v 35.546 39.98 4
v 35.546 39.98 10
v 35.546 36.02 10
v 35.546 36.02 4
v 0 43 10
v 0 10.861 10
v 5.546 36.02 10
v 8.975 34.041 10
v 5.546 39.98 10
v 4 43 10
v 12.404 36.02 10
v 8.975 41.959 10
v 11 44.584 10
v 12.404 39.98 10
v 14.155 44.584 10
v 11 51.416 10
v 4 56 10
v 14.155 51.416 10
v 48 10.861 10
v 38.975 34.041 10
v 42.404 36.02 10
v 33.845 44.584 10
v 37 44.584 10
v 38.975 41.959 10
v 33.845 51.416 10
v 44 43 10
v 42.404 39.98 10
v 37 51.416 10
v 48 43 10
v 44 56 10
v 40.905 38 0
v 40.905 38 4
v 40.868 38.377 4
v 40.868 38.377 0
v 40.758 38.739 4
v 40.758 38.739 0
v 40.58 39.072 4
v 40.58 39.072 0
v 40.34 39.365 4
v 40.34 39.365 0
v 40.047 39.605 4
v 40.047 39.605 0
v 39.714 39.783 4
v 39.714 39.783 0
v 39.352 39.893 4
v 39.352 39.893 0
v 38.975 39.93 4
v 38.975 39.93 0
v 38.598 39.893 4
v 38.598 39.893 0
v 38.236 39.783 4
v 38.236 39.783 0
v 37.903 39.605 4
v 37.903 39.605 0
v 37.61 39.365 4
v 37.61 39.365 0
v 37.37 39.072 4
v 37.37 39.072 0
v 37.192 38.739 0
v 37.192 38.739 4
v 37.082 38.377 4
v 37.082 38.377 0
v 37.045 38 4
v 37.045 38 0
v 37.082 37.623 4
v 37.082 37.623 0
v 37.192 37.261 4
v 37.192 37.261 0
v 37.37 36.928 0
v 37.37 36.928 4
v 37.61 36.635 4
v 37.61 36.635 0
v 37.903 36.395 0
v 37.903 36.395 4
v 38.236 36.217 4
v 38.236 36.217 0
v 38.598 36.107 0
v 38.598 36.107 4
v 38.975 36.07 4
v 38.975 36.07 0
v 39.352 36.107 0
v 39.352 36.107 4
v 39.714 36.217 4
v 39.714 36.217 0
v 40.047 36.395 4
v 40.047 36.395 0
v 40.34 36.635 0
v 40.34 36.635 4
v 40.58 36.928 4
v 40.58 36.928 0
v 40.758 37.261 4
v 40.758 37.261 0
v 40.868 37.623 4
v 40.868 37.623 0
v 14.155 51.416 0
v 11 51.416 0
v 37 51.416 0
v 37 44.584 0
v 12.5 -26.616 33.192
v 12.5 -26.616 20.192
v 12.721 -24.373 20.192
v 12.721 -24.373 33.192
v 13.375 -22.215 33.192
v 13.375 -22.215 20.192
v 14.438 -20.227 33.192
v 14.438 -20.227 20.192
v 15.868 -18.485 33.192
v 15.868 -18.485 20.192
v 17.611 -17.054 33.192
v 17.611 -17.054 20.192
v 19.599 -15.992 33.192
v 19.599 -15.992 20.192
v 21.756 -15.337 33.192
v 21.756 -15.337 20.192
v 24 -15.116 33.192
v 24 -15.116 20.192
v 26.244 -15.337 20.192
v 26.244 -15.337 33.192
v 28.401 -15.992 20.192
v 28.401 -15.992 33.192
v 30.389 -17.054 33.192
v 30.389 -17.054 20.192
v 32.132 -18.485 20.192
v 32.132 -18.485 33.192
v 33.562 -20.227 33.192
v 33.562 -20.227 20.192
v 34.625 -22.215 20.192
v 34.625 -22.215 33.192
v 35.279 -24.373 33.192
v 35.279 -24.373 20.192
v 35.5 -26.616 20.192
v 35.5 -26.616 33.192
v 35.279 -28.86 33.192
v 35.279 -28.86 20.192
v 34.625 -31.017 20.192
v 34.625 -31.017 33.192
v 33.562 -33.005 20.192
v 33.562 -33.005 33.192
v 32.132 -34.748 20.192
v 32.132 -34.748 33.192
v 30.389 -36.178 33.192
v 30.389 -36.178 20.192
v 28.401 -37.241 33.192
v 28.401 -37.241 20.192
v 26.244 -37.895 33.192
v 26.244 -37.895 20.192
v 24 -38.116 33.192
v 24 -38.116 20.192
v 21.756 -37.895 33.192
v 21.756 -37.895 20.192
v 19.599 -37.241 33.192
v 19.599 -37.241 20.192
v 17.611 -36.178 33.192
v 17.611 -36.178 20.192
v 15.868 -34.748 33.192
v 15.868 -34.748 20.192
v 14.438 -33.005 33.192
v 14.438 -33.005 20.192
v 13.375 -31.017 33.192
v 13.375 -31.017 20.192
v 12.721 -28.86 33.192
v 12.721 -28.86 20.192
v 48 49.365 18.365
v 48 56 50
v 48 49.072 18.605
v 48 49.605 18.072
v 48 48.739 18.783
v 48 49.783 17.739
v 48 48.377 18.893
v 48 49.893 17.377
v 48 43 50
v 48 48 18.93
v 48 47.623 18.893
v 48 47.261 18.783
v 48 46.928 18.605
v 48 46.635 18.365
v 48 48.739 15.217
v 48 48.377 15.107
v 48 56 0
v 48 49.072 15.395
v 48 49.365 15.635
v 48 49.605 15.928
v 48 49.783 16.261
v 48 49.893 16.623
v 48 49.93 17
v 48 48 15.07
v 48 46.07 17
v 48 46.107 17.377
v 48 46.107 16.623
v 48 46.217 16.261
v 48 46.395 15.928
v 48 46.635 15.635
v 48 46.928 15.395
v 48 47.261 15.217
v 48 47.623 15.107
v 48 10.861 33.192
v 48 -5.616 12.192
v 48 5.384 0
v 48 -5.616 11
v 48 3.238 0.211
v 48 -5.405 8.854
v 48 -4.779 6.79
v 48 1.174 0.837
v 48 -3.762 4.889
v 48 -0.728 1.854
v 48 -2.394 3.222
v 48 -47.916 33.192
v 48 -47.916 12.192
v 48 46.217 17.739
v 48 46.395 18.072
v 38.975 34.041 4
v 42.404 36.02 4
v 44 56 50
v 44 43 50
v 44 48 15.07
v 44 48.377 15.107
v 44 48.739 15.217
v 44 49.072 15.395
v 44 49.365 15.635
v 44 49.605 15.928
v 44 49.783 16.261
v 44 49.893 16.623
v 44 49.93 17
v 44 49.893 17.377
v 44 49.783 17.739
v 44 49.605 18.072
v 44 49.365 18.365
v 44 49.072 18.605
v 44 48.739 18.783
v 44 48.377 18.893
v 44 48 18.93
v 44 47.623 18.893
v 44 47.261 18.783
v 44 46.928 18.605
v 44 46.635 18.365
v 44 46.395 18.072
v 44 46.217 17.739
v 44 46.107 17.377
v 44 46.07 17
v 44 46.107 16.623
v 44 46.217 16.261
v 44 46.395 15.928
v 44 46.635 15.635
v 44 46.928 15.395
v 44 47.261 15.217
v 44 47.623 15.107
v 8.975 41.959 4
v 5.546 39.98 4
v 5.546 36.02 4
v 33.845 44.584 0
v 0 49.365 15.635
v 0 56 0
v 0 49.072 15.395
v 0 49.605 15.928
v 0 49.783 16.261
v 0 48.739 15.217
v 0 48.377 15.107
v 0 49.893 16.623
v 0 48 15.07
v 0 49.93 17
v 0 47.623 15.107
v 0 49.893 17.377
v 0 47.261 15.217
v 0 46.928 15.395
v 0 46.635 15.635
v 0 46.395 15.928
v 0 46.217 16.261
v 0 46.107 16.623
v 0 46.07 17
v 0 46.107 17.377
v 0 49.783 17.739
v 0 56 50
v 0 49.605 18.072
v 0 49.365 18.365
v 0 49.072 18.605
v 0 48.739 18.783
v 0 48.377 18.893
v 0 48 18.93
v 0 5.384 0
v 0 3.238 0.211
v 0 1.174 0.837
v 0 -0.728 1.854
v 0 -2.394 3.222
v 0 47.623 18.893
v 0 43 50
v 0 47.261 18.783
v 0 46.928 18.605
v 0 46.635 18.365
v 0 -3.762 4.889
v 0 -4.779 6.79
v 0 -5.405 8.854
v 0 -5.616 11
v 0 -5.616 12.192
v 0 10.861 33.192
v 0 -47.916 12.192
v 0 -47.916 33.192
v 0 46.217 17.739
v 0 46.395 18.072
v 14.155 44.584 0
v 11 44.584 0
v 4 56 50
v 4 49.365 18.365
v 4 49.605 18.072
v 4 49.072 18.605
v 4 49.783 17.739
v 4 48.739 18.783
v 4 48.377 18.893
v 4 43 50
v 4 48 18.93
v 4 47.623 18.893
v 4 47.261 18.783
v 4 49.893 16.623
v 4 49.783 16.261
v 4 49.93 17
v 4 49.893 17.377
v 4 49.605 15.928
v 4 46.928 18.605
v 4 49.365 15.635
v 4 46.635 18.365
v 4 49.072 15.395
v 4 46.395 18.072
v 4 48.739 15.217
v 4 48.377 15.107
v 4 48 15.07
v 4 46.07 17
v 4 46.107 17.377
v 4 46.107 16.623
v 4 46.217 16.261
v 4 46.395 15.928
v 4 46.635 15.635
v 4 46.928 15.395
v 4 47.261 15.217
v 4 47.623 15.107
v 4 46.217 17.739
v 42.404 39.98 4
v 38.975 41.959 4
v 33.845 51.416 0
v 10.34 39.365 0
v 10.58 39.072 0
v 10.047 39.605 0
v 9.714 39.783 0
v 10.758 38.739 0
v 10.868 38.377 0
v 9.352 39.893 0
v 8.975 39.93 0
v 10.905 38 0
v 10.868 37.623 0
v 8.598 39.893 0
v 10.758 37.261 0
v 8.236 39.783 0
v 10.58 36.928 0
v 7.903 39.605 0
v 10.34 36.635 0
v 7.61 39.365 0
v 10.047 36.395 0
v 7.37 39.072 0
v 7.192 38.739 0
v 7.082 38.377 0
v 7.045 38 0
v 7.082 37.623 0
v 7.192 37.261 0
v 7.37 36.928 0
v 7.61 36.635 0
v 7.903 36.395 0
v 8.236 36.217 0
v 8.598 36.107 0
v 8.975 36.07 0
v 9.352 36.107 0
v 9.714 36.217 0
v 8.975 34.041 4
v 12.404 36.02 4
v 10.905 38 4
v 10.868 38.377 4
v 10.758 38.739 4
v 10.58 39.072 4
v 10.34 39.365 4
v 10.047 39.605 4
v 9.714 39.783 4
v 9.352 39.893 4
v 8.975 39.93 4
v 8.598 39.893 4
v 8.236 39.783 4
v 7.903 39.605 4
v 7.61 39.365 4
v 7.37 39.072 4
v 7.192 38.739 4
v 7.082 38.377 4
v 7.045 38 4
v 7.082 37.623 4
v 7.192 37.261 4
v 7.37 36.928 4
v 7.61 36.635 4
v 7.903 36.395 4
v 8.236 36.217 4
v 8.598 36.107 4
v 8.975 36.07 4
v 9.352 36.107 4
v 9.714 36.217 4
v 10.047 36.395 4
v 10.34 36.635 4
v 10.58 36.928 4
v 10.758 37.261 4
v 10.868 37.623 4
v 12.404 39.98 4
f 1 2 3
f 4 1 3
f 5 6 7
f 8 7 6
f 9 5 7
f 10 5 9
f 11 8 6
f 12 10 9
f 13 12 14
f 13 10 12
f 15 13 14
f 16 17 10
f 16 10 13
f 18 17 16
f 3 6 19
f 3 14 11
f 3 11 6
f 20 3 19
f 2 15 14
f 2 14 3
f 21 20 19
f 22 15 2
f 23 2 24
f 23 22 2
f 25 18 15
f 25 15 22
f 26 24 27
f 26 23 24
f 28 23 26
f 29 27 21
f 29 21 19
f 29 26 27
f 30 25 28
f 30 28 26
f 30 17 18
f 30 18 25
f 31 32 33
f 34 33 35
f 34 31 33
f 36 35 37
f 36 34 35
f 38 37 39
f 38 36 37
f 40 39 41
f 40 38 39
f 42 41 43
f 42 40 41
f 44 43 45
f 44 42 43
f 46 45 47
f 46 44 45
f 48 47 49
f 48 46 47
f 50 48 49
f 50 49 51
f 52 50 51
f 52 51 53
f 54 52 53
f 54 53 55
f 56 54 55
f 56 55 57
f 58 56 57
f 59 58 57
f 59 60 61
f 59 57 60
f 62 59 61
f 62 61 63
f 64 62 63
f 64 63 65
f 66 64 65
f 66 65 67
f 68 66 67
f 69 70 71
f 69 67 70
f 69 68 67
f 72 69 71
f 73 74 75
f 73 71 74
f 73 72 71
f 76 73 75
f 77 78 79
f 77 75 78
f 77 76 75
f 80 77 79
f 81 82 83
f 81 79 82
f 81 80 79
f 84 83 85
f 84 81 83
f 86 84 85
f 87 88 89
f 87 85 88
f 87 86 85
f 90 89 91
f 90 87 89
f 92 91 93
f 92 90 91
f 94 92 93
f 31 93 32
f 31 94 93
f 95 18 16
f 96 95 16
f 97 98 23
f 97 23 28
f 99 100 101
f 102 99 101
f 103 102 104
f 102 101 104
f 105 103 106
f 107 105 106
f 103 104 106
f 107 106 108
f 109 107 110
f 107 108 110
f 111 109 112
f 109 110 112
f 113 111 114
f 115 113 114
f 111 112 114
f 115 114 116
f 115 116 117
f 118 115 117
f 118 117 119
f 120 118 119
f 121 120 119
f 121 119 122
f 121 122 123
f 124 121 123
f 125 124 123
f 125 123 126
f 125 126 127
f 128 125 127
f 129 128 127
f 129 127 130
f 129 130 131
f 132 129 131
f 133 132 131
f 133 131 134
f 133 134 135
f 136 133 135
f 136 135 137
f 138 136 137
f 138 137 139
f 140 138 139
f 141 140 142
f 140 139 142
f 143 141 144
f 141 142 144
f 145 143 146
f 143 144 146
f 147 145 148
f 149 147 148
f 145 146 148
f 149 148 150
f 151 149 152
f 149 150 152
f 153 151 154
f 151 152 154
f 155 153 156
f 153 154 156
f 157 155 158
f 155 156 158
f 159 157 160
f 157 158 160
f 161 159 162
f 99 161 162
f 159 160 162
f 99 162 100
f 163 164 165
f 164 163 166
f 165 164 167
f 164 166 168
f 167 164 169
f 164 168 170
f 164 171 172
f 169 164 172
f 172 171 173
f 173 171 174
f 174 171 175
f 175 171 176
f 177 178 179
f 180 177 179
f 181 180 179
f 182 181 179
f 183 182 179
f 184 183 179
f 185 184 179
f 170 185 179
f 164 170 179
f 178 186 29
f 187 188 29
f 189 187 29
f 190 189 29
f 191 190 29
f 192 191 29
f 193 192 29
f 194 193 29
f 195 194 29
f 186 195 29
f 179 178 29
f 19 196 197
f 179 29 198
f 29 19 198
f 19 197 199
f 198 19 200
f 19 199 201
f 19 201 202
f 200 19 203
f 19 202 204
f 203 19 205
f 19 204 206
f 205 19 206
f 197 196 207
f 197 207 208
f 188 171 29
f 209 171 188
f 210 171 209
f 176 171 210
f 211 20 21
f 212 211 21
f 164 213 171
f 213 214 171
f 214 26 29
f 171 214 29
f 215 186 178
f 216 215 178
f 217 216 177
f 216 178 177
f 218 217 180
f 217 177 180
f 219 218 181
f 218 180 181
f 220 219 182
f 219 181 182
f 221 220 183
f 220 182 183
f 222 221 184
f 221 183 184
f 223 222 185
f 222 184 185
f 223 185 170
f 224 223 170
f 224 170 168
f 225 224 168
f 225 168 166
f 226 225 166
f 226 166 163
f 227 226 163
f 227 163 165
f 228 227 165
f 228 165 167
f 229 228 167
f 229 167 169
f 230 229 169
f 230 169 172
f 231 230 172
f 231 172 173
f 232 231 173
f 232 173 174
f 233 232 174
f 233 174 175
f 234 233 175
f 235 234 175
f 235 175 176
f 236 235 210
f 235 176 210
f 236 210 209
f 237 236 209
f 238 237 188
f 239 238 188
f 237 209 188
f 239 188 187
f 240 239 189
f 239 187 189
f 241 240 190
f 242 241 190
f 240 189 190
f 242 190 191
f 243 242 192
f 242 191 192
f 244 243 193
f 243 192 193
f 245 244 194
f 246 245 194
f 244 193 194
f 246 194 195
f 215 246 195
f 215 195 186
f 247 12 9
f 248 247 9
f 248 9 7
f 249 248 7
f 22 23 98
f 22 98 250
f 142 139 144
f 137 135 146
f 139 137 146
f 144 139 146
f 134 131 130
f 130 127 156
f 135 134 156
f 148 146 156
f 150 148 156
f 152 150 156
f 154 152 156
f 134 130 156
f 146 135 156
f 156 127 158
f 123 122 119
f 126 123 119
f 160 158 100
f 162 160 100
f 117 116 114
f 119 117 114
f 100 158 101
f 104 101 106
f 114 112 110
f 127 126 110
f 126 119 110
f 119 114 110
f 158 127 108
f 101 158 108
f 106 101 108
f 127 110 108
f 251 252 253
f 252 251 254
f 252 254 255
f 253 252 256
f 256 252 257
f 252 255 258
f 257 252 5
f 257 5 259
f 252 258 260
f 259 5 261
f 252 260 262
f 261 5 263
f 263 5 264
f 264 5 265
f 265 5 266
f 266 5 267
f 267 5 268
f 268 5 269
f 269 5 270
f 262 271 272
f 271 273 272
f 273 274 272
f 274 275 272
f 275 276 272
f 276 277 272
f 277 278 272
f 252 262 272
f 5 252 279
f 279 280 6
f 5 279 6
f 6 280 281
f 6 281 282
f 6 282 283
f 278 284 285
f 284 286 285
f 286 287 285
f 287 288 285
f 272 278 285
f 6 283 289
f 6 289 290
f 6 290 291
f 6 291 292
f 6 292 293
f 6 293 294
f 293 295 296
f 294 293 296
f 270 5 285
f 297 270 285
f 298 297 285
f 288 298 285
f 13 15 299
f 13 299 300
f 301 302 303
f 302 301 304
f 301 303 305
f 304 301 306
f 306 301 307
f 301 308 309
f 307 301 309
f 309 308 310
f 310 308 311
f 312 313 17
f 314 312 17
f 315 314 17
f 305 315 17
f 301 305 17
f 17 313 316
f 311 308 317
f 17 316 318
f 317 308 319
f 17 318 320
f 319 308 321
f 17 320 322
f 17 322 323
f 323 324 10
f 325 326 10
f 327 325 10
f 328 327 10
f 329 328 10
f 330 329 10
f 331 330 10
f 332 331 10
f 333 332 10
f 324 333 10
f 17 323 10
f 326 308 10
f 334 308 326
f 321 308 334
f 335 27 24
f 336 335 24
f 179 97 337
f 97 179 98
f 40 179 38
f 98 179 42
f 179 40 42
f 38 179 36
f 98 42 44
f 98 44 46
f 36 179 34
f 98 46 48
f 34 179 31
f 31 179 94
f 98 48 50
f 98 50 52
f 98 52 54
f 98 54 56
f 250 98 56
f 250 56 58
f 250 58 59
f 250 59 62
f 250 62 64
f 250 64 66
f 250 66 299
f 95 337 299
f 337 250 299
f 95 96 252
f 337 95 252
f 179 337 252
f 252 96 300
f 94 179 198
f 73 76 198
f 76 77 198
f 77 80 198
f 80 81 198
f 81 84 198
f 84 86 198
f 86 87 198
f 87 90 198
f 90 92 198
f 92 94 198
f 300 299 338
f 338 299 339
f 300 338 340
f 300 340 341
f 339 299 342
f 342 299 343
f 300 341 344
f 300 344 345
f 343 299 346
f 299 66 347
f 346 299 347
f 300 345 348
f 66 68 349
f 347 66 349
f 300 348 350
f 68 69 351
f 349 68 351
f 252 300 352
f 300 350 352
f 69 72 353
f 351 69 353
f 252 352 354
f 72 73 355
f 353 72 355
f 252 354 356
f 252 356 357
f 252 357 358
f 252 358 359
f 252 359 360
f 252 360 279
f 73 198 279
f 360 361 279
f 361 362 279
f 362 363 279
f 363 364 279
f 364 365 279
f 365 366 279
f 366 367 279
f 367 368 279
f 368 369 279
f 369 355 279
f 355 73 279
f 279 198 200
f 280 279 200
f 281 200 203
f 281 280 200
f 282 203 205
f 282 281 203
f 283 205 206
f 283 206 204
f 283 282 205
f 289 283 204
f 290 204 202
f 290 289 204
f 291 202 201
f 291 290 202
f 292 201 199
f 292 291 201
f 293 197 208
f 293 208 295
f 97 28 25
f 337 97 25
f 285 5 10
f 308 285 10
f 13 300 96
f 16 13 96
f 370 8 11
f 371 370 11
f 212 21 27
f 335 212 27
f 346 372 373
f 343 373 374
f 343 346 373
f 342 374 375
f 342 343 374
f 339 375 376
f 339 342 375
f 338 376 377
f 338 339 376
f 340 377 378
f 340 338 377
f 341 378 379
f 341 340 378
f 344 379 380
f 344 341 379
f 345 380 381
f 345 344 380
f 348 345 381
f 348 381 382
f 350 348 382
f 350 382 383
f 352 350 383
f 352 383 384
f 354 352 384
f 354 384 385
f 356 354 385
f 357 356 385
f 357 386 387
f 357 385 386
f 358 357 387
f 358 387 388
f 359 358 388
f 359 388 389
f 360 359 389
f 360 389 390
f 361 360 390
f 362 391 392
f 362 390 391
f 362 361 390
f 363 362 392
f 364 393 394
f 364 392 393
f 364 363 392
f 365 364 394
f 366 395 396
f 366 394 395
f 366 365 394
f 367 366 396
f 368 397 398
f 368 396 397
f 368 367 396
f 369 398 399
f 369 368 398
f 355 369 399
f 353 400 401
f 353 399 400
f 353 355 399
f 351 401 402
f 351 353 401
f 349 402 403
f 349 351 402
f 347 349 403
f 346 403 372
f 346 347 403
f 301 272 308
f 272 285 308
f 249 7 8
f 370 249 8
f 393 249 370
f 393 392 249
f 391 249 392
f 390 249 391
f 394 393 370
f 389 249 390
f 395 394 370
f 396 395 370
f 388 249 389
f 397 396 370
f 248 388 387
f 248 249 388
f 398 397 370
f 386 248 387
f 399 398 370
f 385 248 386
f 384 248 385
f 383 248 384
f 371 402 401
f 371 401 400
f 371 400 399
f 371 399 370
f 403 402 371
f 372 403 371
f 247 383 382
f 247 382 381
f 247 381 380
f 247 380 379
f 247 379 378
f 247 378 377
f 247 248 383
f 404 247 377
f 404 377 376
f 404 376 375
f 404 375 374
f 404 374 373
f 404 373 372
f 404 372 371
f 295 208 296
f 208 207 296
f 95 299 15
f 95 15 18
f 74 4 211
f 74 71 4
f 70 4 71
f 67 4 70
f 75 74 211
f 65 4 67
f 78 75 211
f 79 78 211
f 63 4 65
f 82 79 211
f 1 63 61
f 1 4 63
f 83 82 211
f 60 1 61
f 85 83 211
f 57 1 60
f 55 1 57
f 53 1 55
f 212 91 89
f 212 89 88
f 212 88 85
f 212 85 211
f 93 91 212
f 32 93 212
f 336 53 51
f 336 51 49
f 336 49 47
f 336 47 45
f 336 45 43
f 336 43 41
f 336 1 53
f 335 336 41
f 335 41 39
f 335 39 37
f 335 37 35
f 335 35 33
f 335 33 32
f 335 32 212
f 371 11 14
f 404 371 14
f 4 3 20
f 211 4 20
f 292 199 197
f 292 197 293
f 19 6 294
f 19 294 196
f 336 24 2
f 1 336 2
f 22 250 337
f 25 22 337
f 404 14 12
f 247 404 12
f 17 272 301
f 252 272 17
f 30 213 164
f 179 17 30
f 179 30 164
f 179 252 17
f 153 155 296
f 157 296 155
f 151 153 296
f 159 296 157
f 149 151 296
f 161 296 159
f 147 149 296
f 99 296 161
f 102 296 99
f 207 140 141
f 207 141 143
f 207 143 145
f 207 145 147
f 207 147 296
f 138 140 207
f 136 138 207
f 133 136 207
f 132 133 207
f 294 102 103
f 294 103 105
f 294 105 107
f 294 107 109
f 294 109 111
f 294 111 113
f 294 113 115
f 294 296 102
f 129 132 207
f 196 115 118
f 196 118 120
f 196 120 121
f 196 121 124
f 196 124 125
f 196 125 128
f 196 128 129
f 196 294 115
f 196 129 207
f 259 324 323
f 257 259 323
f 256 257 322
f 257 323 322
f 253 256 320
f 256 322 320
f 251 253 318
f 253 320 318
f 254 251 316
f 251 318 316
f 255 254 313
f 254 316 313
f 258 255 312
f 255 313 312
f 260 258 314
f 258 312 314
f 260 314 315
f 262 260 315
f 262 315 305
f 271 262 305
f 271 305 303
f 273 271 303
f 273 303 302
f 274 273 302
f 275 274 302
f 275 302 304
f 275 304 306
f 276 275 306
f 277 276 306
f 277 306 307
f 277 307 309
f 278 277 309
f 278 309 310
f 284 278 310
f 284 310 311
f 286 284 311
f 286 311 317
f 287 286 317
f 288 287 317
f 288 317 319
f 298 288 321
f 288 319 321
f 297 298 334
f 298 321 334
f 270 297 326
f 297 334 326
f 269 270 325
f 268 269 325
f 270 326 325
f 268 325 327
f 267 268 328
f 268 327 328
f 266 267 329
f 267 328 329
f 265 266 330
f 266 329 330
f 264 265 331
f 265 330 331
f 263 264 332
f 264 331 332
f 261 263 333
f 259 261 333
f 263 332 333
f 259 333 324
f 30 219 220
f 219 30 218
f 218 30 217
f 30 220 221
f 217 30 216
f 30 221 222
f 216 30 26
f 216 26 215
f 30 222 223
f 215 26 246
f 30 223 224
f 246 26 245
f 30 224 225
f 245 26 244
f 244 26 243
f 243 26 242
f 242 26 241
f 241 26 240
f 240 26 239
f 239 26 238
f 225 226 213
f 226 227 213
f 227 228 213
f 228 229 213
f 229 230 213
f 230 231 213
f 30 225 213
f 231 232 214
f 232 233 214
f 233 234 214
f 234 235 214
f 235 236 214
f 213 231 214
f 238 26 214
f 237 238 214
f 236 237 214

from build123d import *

# Parameters (mm, degrees)
SKETCH1_W           = 48
SKETCH1_H           = 53
SKETCH1_R           = 1.9304
BOSS_EXTRUDE1_DEPTH = 10
SKETCH2_W           = 48
SKETCH2_H           = 5.616325
BOSS_EXTRUDE2_DEPTH = 33.1917878
SKETCH4_W           = 4
SKETCH4_H           = 10
BOSS_EXTRUDE4_DEPTH = 40
SKETCH5_W           = 48
SKETCH5_H           = 10.8609375
BOSS_EXTRUDE5_DEPTH = 23.1917878
SKETCH6_W           = 48
SKETCH6_H           = 5
BOSS_EXTRUDE6_DEPTH = 42.3
CUT_EXTRUDE1_REACH  = 78.862
SKETCH8_R           = 11.5
SKETCH9_R           = 1.9304
CUT_EXTRUDE2_DEPTH  = 88.252507127
CUT_EXTRUDE3_REACH  = 89.253
SKETCH10_W          = 3.15468
SKETCH10_H          = 6.8326
BOSS_EXTRUDE7_START = 8
SKETCH11_W          = 48
SKETCH11_H          = 42.3
SKETCH11_R          = 11.5
BOSS_EXTRUDE7_DEPTH = 8
SKETCH12_W          = 48
SKETCH12_H          = 42.3
BOSS_EXTRUDE8_DEPTH = 8
FILLET1_R           = 11
BOSS_EXTRUDE9_DEPTH = 3
CUT_EXTRUDE4_DEPTH  = 6


with BuildPart() as part:
    # Sketch1 → Boss-Extrude1 (new body)
    with BuildSketch(Plane.XY):
        with Locations((24, 26.5)):
            Rectangle(SKETCH1_W, SKETCH1_H)
        with Locations((8.975, 38)):
            Circle(SKETCH1_R, mode=Mode.SUBTRACT)
        with Locations((38.975, 38)):
            Circle(SKETCH1_R, mode=Mode.SUBTRACT)
    extrude(amount=BOSS_EXTRUDE1_DEPTH)

    # Sketch2 → Boss-Extrude2 (add)
    with BuildSketch(Plane(origin=(0, 0, 0), x_dir=(-1, 0, 0), z_dir=(0, 0, -1))):
        with Locations((-24, -2.8081625)):
            Rectangle(SKETCH2_W, SKETCH2_H)
    extrude(amount=-BOSS_EXTRUDE2_DEPTH)

    # Sketch4 → Boss-Extrude4 (add)
    with BuildSketch(Plane.XY.offset(10)):
        with Locations((2, 48)):
            Rectangle(SKETCH4_W, SKETCH4_H)
        with Locations((46, 48)):
            Rectangle(SKETCH4_W, SKETCH4_H)
    extrude(amount=BOSS_EXTRUDE4_DEPTH)

    # Sketch5 → Boss-Extrude5 (add)
    with BuildSketch(Plane.XY.offset(10)):
        with Locations((24, 5.43046875)):
            Rectangle(SKETCH5_W, SKETCH5_H)
    extrude(amount=BOSS_EXTRUDE5_DEPTH)

    # Sketch6 → Boss-Extrude6 (add)
    with BuildSketch(Plane.XZ.offset(5.616325)):
        with Locations((24, 30.6917878)):
            Rectangle(SKETCH6_W, SKETCH6_H)
    extrude(amount=BOSS_EXTRUDE6_DEPTH)

    # Sketch8 → Cut-Extrude1 (cut, up to next)
    with BuildSketch(Plane(origin=(0, 0, 28.1917878), x_dir=(-1, 0, 0), z_dir=(0, 0, -1)), mode=Mode.PRIVATE) as cut_extrude1_sk1:
        with Locations((-24, -26.616325)):
            Circle(SKETCH8_R)
    cut_extrude1_tool1 = extrude(cut_extrude1_sk1.sketch, amount=-CUT_EXTRUDE1_REACH, mode=Mode.PRIVATE) & part.part
    add(cut_extrude1_tool1.solids().sort_by_distance((24, -26.616325, 28.191788))[0], mode=Mode.SUBTRACT)

    # Sketch9 → Cut-Extrude2 (cut, through all)
    with BuildSketch(Plane(origin=(48, 0, 0), x_dir=(0, 0, -1), z_dir=(1, 0, 0))):
        with Locations((-17, 48)):
            Circle(SKETCH9_R)
    extrude(amount=-CUT_EXTRUDE2_DEPTH, mode=Mode.SUBTRACT)

    # Sketch10 → Cut-Extrude3 (cut, up to next)
    with BuildSketch(Plane(origin=(0, 0, 0), x_dir=(-1, 0, 0), z_dir=(0, 0, -1)), mode=Mode.PRIVATE) as cut_extrude3_sk1:
        with Locations((-35.42266, 48)):
            Rectangle(SKETCH10_W, SKETCH10_H)
    cut_extrude3_tool1 = extrude(cut_extrude3_sk1.sketch, amount=-CUT_EXTRUDE3_REACH, mode=Mode.PRIVATE) & part.part
    # Sketch10 → Cut-Extrude3 (cut, up to next)
    with BuildSketch(Plane(origin=(0, 0, 0), x_dir=(-1, 0, 0), z_dir=(0, 0, -1)), mode=Mode.PRIVATE) as cut_extrude3_sk2:
        with Locations((-12.57734, 48)):
            Rectangle(SKETCH10_W, SKETCH10_H)
    cut_extrude3_tool2 = extrude(cut_extrude3_sk2.sketch, amount=-CUT_EXTRUDE3_REACH, mode=Mode.PRIVATE) & part.part
    add(cut_extrude3_tool1.solids().sort_by_distance((35.42266, 48, 0))[0], mode=Mode.SUBTRACT)
    add(cut_extrude3_tool2.solids().sort_by_distance((12.57734, 48, 0))[0], mode=Mode.SUBTRACT)

    # Sketch11 → Boss-Extrude7 (add)
    with BuildSketch(Plane(origin=(0, 0, 28.1917878), x_dir=(-1, 0, 0), z_dir=(0, 0, -1)).offset(BOSS_EXTRUDE7_START)):
        with Locations((-24, -26.766325)):
            Rectangle(SKETCH11_W, SKETCH11_H)
        with Locations((-24, -26.616325)):
            Circle(SKETCH11_R, mode=Mode.SUBTRACT)
    extrude(amount=-BOSS_EXTRUDE7_DEPTH)

    # Sketch12 → Boss-Extrude8 (add)
    with BuildSketch(Plane(origin=(0, 0, 20.1917878), x_dir=(-1, 0, 0), z_dir=(0, 0, -1))):
        with Locations((-24, -26.766325)):
            Rectangle(SKETCH12_W, SKETCH12_H)
    extrude(amount=BOSS_EXTRUDE8_DEPTH)

    # Fillet1
    fillet1_edges = [part.edges().sort_by_distance(p)[0] for p in [
        (24, -5.616325, 0),
    ]]
    fillet(fillet1_edges, radius=FILLET1_R)

    # Sketch13 → Boss-Extrude9 (add)
    with BuildSketch(Plane(origin=(0, 53, 0), x_dir=(1, 0, 0), z_dir=(0, 1, 0))):
        Polygon((0, 0), (0, -50), (4, -50), (4, -10), (44, -10), (44, -50), (48, -50), (48, 0), align=None)
    extrude(amount=BOSS_EXTRUDE9_DEPTH)

    # Sketch14 → Cut-Extrude4 (cut)
    with BuildSketch(Plane.XY.offset(10)):
        Polygon((8.975, 41.9594682), (5.545999953, 39.9797341), (5.545999953, 36.0202659), (8.975, 34.0405318), (12.404000047, 36.0202659), (12.404000047, 39.9797341), align=None)
        Polygon((38.975, 41.9594682), (35.545999953, 39.9797341), (35.545999953, 36.0202659), (38.975, 34.0405318), (42.404000047, 36.0202659), (42.404000047, 39.9797341), align=None)
    extrude(amount=-CUT_EXTRUDE4_DEPTH, mode=Mode.SUBTRACT)


solid = part.part
